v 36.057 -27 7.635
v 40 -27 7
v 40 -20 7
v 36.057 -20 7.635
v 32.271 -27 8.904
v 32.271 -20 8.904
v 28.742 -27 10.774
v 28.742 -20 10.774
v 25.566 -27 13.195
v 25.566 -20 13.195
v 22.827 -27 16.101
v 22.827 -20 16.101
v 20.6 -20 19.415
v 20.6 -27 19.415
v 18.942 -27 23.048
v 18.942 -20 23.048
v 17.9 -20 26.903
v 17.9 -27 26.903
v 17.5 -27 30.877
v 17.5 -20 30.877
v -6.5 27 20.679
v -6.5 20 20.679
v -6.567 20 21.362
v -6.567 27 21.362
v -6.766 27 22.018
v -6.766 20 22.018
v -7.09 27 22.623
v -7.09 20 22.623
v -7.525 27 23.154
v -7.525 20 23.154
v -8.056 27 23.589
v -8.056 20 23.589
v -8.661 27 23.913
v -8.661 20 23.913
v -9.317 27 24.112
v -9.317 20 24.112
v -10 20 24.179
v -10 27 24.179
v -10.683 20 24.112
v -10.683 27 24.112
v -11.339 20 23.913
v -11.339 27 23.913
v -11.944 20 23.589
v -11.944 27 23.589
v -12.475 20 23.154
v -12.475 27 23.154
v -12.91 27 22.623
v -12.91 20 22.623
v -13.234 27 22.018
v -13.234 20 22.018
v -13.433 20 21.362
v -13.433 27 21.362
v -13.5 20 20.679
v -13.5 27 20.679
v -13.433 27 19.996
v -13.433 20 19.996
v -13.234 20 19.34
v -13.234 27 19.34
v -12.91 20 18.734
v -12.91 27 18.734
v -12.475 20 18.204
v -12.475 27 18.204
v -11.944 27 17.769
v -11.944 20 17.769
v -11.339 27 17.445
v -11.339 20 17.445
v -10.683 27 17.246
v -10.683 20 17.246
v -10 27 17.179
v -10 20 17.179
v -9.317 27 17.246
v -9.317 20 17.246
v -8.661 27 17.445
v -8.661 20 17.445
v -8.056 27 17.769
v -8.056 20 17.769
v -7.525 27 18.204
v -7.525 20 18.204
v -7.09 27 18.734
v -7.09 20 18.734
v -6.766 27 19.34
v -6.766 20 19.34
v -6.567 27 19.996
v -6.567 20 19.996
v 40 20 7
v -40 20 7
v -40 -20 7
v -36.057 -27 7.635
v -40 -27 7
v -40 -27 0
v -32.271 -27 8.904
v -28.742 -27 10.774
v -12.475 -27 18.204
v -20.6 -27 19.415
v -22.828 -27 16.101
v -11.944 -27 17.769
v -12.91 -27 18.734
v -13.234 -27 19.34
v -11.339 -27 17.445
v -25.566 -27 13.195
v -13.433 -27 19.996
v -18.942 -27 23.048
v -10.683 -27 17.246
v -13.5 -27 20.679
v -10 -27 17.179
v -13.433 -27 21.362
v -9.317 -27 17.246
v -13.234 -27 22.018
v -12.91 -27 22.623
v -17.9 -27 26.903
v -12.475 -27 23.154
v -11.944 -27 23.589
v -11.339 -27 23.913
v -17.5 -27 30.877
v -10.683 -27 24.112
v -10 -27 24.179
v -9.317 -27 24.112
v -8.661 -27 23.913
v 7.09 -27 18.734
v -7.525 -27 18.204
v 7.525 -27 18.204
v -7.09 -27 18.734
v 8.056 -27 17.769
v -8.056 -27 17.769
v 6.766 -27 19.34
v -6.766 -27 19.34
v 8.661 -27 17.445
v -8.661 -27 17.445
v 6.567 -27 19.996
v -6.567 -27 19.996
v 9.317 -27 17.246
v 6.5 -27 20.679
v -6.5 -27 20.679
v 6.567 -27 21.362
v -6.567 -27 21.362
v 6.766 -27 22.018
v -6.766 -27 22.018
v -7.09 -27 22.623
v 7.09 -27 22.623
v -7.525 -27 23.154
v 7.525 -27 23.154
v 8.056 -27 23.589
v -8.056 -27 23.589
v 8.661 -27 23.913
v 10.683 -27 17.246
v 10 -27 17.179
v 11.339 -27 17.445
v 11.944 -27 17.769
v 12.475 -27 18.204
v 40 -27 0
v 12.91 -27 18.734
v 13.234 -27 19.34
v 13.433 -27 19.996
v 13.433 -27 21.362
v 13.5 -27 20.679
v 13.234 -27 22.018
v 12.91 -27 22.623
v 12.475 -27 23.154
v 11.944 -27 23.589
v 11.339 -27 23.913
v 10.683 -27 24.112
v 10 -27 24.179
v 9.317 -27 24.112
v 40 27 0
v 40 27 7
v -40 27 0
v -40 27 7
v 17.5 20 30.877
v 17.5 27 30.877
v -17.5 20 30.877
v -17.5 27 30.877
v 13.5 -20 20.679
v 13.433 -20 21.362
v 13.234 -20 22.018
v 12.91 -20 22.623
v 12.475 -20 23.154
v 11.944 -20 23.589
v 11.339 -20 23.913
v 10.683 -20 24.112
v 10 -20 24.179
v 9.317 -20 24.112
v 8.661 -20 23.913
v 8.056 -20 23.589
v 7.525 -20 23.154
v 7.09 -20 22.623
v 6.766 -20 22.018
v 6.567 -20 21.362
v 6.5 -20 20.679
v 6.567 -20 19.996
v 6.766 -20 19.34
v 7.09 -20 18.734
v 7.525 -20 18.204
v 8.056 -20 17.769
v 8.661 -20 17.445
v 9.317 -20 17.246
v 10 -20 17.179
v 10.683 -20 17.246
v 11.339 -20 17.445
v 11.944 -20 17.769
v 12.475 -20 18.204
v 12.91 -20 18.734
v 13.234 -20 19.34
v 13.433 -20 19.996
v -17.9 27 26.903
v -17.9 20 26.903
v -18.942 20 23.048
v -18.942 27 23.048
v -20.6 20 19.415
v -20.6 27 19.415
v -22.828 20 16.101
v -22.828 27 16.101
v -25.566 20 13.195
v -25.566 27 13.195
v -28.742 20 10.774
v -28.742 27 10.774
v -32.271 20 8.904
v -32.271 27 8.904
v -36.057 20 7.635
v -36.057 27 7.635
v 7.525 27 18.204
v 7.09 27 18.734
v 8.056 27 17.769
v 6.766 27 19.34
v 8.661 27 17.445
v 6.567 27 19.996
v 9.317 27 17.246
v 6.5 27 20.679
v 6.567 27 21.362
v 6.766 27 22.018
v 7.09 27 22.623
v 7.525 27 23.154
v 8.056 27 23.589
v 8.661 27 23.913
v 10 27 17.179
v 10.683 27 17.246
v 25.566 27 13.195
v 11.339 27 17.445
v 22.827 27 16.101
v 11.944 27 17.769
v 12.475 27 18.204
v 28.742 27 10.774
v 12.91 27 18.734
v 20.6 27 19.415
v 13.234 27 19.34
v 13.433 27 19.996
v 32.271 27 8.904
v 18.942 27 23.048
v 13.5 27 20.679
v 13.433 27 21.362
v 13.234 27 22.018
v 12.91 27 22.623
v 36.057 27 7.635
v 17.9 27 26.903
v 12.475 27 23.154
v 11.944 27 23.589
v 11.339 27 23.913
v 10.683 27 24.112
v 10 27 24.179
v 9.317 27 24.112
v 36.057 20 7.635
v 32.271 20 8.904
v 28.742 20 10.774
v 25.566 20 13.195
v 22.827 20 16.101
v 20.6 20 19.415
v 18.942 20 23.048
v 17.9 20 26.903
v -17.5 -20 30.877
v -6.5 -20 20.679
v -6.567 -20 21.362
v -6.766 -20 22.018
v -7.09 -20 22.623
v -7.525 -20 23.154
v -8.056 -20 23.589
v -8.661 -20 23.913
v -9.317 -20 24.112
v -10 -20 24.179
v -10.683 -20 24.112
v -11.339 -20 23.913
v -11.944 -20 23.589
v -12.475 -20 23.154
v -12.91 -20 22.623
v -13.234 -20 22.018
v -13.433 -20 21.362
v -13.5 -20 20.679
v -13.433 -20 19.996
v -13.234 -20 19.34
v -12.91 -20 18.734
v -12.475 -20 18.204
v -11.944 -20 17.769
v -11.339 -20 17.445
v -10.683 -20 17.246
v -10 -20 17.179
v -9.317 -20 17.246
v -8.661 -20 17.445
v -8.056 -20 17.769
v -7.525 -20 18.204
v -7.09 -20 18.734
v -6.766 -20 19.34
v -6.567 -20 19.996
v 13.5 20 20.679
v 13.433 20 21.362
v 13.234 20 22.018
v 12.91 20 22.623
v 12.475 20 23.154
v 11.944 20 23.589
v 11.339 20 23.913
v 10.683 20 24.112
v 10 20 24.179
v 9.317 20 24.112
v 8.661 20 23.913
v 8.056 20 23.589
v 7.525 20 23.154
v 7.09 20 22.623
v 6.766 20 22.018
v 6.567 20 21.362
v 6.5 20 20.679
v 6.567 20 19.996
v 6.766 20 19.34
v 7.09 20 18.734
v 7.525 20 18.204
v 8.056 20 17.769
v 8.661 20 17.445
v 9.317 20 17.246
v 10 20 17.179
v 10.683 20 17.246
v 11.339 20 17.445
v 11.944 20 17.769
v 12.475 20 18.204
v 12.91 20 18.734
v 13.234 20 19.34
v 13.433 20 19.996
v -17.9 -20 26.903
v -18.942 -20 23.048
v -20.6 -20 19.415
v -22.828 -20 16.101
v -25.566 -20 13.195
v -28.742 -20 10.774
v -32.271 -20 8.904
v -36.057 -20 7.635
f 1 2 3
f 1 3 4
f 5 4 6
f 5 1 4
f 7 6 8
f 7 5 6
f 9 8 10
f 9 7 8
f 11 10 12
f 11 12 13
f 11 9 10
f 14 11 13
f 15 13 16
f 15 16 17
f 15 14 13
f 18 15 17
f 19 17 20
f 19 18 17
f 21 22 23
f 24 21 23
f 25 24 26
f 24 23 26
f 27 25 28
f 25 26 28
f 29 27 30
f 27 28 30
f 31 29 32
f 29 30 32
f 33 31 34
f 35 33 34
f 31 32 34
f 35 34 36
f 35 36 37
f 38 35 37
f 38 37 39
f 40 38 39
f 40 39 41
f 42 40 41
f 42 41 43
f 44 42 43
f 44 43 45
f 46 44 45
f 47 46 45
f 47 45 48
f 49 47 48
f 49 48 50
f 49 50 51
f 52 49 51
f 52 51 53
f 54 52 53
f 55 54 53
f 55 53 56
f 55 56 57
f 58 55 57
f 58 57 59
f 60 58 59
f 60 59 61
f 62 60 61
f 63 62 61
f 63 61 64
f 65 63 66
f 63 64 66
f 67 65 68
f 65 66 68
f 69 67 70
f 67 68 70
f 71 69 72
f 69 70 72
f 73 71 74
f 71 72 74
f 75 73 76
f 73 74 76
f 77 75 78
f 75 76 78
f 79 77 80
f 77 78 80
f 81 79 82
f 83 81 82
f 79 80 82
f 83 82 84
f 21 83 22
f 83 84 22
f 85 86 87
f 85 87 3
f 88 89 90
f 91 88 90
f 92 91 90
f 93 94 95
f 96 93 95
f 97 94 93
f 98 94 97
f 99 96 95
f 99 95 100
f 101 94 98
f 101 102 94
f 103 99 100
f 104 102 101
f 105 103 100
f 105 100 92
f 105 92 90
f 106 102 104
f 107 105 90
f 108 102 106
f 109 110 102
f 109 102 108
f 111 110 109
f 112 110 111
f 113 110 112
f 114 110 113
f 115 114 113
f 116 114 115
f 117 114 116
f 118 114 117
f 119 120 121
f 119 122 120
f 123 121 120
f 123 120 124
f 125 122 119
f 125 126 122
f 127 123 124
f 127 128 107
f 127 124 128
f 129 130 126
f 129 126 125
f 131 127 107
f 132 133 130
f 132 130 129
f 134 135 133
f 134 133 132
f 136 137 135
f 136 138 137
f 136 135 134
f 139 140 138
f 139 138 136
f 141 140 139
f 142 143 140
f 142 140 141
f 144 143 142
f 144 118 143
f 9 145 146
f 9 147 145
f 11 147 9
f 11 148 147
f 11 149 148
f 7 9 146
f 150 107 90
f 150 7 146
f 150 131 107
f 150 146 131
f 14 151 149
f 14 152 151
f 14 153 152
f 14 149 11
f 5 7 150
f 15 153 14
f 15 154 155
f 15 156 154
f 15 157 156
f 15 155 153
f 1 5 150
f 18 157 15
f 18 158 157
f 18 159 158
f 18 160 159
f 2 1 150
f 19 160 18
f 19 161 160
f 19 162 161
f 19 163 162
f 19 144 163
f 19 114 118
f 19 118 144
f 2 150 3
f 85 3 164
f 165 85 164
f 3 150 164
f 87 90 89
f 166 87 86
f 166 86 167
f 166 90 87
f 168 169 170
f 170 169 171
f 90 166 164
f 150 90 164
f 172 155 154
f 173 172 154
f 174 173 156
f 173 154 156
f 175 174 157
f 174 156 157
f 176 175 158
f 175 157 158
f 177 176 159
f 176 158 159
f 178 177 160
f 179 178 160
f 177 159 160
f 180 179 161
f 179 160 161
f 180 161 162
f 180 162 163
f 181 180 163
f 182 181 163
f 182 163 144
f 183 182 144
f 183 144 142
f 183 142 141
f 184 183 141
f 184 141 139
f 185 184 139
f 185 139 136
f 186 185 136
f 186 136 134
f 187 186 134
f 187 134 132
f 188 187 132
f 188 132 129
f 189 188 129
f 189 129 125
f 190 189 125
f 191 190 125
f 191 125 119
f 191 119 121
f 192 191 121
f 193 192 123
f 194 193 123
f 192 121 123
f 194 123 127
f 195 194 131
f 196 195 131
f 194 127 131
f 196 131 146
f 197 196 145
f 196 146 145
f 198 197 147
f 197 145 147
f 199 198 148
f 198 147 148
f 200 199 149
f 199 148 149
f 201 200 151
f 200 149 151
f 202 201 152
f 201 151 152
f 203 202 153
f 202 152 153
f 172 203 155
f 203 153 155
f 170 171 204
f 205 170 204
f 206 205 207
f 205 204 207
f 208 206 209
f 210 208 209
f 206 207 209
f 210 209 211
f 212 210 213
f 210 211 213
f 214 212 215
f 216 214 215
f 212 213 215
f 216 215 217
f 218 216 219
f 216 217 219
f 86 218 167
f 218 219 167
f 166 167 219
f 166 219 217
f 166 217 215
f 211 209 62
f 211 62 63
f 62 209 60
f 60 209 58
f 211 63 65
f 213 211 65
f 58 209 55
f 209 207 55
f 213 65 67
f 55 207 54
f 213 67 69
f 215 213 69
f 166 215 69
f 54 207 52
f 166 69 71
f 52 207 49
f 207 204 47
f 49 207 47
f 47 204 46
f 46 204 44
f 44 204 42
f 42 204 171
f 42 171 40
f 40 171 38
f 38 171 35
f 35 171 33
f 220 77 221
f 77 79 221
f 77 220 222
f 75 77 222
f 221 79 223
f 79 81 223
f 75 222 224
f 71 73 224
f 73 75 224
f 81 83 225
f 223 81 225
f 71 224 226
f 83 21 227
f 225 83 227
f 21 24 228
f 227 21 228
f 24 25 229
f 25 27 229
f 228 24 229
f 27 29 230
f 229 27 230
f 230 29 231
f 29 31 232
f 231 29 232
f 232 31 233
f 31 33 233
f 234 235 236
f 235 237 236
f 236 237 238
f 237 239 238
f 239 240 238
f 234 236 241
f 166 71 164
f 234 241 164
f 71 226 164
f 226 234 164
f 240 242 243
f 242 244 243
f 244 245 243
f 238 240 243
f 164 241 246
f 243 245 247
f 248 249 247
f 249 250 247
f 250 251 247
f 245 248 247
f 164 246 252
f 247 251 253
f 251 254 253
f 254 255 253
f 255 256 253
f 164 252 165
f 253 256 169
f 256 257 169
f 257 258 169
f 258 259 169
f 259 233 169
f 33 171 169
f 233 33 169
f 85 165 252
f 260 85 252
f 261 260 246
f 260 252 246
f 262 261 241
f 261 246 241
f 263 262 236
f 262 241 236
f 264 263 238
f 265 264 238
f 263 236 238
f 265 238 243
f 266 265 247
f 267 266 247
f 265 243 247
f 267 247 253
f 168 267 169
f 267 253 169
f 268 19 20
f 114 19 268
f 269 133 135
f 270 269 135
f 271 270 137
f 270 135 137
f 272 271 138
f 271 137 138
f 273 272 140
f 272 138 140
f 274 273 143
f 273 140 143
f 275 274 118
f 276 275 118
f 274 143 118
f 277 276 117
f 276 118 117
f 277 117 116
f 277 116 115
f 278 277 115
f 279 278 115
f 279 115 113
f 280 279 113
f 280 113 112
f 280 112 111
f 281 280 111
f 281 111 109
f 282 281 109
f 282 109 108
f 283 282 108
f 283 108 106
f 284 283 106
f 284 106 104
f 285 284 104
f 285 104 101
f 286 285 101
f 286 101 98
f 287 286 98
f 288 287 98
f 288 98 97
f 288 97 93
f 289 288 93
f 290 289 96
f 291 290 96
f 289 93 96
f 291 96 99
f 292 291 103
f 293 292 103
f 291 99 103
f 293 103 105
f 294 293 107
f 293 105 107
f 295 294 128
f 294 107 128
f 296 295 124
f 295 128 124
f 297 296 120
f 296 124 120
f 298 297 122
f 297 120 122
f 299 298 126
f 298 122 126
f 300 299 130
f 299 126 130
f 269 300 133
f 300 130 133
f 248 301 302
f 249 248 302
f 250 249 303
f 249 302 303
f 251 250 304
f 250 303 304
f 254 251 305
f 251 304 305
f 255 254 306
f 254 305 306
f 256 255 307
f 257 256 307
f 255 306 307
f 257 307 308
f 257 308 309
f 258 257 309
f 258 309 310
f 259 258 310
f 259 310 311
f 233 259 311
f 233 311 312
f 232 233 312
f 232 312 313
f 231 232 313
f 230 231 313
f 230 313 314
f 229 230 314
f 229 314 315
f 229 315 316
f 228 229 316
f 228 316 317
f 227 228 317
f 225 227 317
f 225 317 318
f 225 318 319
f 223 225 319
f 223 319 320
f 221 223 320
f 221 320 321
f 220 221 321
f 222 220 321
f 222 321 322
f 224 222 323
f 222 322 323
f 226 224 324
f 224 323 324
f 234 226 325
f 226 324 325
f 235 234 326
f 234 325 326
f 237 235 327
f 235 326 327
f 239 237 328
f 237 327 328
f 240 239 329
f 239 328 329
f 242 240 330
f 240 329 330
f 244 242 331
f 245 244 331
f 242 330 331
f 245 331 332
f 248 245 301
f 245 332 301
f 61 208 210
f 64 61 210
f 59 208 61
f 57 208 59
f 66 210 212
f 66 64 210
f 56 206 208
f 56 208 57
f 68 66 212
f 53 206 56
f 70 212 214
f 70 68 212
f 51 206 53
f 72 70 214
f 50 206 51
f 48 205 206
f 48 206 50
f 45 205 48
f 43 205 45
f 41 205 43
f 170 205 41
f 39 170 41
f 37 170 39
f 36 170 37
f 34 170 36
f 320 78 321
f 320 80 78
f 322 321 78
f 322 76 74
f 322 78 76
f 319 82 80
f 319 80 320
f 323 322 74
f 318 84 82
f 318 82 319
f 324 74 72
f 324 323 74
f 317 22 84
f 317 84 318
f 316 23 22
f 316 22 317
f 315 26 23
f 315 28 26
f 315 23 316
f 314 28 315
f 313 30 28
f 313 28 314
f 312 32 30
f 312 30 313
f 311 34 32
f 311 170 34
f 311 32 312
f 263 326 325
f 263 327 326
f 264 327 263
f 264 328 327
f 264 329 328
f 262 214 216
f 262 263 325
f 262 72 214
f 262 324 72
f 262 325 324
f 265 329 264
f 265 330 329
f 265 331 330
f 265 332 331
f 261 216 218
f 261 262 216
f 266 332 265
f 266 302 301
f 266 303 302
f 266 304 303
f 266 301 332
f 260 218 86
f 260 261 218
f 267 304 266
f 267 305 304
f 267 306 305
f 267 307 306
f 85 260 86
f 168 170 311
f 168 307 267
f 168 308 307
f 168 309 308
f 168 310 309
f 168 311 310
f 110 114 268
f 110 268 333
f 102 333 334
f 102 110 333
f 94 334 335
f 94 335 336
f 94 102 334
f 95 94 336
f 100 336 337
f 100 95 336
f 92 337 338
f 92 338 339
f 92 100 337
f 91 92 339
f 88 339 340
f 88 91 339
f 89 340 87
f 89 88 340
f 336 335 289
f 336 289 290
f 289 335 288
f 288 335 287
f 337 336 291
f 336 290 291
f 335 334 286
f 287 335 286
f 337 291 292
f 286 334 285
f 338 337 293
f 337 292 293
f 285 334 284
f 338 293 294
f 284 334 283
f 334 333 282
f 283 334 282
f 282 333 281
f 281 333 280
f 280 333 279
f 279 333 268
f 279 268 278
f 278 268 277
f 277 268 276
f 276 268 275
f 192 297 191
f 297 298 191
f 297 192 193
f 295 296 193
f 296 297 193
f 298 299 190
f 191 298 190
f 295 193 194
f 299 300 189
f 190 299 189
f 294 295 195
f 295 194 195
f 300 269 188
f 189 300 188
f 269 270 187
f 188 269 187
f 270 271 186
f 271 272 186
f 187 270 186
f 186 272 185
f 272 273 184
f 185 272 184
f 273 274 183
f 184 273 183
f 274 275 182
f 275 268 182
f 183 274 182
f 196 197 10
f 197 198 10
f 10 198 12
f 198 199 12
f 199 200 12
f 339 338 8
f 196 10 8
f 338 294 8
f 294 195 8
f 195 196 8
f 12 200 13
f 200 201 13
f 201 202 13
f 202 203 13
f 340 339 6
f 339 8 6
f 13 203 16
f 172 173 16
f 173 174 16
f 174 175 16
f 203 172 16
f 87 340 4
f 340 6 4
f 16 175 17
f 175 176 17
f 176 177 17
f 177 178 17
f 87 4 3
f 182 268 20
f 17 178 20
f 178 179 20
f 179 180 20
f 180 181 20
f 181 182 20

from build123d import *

# Parameters (mm, degrees)
F0_W     = 80
F0_H     = 54
F1_DEPTH = 7
F3_DEPTH = 7
F5_R     = 3.5
F6_DEPTH = 54.001


with BuildPart() as f1:
    # F0 (on Top) → F1 (new body)
    with BuildSketch(Plane.XY):
        Rectangle(F0_W, F0_H)
    extrude(amount=F1_DEPTH)

    # F2 (on face) → F3 (join)
    with BuildSketch(Plane.XZ.offset(27)):
        with BuildLine():
            Line((17.5, 30.876799), (-17.5, 30.876799))
            ThreePointArc((-17.5, 30.876799), (-24.137327, 14.591705), (-40, 7))
            Line((-40, 7), (40, 7))
            ThreePointArc((40, 7), (24.137307, 14.591686), (17.5, 30.876799))
        make_face()
    extrude(amount=-F3_DEPTH)

    # F4: F1 across plane


with BuildPart() as f1_1:
    add(f1.part)
    add(f1.part.mirror(Plane.XZ))

    # F5 (on face) → F6 (cut, through all)
    with BuildSketch(Plane.XZ.offset(27)):
        with Locations((-10, 20.678958)):
            Circle(F5_R)
        with Locations((10, 20.678958)):
            Circle(F5_R)
    extrude(amount=-F6_DEPTH, mode=Mode.SUBTRACT)


solid = f1_1.part
